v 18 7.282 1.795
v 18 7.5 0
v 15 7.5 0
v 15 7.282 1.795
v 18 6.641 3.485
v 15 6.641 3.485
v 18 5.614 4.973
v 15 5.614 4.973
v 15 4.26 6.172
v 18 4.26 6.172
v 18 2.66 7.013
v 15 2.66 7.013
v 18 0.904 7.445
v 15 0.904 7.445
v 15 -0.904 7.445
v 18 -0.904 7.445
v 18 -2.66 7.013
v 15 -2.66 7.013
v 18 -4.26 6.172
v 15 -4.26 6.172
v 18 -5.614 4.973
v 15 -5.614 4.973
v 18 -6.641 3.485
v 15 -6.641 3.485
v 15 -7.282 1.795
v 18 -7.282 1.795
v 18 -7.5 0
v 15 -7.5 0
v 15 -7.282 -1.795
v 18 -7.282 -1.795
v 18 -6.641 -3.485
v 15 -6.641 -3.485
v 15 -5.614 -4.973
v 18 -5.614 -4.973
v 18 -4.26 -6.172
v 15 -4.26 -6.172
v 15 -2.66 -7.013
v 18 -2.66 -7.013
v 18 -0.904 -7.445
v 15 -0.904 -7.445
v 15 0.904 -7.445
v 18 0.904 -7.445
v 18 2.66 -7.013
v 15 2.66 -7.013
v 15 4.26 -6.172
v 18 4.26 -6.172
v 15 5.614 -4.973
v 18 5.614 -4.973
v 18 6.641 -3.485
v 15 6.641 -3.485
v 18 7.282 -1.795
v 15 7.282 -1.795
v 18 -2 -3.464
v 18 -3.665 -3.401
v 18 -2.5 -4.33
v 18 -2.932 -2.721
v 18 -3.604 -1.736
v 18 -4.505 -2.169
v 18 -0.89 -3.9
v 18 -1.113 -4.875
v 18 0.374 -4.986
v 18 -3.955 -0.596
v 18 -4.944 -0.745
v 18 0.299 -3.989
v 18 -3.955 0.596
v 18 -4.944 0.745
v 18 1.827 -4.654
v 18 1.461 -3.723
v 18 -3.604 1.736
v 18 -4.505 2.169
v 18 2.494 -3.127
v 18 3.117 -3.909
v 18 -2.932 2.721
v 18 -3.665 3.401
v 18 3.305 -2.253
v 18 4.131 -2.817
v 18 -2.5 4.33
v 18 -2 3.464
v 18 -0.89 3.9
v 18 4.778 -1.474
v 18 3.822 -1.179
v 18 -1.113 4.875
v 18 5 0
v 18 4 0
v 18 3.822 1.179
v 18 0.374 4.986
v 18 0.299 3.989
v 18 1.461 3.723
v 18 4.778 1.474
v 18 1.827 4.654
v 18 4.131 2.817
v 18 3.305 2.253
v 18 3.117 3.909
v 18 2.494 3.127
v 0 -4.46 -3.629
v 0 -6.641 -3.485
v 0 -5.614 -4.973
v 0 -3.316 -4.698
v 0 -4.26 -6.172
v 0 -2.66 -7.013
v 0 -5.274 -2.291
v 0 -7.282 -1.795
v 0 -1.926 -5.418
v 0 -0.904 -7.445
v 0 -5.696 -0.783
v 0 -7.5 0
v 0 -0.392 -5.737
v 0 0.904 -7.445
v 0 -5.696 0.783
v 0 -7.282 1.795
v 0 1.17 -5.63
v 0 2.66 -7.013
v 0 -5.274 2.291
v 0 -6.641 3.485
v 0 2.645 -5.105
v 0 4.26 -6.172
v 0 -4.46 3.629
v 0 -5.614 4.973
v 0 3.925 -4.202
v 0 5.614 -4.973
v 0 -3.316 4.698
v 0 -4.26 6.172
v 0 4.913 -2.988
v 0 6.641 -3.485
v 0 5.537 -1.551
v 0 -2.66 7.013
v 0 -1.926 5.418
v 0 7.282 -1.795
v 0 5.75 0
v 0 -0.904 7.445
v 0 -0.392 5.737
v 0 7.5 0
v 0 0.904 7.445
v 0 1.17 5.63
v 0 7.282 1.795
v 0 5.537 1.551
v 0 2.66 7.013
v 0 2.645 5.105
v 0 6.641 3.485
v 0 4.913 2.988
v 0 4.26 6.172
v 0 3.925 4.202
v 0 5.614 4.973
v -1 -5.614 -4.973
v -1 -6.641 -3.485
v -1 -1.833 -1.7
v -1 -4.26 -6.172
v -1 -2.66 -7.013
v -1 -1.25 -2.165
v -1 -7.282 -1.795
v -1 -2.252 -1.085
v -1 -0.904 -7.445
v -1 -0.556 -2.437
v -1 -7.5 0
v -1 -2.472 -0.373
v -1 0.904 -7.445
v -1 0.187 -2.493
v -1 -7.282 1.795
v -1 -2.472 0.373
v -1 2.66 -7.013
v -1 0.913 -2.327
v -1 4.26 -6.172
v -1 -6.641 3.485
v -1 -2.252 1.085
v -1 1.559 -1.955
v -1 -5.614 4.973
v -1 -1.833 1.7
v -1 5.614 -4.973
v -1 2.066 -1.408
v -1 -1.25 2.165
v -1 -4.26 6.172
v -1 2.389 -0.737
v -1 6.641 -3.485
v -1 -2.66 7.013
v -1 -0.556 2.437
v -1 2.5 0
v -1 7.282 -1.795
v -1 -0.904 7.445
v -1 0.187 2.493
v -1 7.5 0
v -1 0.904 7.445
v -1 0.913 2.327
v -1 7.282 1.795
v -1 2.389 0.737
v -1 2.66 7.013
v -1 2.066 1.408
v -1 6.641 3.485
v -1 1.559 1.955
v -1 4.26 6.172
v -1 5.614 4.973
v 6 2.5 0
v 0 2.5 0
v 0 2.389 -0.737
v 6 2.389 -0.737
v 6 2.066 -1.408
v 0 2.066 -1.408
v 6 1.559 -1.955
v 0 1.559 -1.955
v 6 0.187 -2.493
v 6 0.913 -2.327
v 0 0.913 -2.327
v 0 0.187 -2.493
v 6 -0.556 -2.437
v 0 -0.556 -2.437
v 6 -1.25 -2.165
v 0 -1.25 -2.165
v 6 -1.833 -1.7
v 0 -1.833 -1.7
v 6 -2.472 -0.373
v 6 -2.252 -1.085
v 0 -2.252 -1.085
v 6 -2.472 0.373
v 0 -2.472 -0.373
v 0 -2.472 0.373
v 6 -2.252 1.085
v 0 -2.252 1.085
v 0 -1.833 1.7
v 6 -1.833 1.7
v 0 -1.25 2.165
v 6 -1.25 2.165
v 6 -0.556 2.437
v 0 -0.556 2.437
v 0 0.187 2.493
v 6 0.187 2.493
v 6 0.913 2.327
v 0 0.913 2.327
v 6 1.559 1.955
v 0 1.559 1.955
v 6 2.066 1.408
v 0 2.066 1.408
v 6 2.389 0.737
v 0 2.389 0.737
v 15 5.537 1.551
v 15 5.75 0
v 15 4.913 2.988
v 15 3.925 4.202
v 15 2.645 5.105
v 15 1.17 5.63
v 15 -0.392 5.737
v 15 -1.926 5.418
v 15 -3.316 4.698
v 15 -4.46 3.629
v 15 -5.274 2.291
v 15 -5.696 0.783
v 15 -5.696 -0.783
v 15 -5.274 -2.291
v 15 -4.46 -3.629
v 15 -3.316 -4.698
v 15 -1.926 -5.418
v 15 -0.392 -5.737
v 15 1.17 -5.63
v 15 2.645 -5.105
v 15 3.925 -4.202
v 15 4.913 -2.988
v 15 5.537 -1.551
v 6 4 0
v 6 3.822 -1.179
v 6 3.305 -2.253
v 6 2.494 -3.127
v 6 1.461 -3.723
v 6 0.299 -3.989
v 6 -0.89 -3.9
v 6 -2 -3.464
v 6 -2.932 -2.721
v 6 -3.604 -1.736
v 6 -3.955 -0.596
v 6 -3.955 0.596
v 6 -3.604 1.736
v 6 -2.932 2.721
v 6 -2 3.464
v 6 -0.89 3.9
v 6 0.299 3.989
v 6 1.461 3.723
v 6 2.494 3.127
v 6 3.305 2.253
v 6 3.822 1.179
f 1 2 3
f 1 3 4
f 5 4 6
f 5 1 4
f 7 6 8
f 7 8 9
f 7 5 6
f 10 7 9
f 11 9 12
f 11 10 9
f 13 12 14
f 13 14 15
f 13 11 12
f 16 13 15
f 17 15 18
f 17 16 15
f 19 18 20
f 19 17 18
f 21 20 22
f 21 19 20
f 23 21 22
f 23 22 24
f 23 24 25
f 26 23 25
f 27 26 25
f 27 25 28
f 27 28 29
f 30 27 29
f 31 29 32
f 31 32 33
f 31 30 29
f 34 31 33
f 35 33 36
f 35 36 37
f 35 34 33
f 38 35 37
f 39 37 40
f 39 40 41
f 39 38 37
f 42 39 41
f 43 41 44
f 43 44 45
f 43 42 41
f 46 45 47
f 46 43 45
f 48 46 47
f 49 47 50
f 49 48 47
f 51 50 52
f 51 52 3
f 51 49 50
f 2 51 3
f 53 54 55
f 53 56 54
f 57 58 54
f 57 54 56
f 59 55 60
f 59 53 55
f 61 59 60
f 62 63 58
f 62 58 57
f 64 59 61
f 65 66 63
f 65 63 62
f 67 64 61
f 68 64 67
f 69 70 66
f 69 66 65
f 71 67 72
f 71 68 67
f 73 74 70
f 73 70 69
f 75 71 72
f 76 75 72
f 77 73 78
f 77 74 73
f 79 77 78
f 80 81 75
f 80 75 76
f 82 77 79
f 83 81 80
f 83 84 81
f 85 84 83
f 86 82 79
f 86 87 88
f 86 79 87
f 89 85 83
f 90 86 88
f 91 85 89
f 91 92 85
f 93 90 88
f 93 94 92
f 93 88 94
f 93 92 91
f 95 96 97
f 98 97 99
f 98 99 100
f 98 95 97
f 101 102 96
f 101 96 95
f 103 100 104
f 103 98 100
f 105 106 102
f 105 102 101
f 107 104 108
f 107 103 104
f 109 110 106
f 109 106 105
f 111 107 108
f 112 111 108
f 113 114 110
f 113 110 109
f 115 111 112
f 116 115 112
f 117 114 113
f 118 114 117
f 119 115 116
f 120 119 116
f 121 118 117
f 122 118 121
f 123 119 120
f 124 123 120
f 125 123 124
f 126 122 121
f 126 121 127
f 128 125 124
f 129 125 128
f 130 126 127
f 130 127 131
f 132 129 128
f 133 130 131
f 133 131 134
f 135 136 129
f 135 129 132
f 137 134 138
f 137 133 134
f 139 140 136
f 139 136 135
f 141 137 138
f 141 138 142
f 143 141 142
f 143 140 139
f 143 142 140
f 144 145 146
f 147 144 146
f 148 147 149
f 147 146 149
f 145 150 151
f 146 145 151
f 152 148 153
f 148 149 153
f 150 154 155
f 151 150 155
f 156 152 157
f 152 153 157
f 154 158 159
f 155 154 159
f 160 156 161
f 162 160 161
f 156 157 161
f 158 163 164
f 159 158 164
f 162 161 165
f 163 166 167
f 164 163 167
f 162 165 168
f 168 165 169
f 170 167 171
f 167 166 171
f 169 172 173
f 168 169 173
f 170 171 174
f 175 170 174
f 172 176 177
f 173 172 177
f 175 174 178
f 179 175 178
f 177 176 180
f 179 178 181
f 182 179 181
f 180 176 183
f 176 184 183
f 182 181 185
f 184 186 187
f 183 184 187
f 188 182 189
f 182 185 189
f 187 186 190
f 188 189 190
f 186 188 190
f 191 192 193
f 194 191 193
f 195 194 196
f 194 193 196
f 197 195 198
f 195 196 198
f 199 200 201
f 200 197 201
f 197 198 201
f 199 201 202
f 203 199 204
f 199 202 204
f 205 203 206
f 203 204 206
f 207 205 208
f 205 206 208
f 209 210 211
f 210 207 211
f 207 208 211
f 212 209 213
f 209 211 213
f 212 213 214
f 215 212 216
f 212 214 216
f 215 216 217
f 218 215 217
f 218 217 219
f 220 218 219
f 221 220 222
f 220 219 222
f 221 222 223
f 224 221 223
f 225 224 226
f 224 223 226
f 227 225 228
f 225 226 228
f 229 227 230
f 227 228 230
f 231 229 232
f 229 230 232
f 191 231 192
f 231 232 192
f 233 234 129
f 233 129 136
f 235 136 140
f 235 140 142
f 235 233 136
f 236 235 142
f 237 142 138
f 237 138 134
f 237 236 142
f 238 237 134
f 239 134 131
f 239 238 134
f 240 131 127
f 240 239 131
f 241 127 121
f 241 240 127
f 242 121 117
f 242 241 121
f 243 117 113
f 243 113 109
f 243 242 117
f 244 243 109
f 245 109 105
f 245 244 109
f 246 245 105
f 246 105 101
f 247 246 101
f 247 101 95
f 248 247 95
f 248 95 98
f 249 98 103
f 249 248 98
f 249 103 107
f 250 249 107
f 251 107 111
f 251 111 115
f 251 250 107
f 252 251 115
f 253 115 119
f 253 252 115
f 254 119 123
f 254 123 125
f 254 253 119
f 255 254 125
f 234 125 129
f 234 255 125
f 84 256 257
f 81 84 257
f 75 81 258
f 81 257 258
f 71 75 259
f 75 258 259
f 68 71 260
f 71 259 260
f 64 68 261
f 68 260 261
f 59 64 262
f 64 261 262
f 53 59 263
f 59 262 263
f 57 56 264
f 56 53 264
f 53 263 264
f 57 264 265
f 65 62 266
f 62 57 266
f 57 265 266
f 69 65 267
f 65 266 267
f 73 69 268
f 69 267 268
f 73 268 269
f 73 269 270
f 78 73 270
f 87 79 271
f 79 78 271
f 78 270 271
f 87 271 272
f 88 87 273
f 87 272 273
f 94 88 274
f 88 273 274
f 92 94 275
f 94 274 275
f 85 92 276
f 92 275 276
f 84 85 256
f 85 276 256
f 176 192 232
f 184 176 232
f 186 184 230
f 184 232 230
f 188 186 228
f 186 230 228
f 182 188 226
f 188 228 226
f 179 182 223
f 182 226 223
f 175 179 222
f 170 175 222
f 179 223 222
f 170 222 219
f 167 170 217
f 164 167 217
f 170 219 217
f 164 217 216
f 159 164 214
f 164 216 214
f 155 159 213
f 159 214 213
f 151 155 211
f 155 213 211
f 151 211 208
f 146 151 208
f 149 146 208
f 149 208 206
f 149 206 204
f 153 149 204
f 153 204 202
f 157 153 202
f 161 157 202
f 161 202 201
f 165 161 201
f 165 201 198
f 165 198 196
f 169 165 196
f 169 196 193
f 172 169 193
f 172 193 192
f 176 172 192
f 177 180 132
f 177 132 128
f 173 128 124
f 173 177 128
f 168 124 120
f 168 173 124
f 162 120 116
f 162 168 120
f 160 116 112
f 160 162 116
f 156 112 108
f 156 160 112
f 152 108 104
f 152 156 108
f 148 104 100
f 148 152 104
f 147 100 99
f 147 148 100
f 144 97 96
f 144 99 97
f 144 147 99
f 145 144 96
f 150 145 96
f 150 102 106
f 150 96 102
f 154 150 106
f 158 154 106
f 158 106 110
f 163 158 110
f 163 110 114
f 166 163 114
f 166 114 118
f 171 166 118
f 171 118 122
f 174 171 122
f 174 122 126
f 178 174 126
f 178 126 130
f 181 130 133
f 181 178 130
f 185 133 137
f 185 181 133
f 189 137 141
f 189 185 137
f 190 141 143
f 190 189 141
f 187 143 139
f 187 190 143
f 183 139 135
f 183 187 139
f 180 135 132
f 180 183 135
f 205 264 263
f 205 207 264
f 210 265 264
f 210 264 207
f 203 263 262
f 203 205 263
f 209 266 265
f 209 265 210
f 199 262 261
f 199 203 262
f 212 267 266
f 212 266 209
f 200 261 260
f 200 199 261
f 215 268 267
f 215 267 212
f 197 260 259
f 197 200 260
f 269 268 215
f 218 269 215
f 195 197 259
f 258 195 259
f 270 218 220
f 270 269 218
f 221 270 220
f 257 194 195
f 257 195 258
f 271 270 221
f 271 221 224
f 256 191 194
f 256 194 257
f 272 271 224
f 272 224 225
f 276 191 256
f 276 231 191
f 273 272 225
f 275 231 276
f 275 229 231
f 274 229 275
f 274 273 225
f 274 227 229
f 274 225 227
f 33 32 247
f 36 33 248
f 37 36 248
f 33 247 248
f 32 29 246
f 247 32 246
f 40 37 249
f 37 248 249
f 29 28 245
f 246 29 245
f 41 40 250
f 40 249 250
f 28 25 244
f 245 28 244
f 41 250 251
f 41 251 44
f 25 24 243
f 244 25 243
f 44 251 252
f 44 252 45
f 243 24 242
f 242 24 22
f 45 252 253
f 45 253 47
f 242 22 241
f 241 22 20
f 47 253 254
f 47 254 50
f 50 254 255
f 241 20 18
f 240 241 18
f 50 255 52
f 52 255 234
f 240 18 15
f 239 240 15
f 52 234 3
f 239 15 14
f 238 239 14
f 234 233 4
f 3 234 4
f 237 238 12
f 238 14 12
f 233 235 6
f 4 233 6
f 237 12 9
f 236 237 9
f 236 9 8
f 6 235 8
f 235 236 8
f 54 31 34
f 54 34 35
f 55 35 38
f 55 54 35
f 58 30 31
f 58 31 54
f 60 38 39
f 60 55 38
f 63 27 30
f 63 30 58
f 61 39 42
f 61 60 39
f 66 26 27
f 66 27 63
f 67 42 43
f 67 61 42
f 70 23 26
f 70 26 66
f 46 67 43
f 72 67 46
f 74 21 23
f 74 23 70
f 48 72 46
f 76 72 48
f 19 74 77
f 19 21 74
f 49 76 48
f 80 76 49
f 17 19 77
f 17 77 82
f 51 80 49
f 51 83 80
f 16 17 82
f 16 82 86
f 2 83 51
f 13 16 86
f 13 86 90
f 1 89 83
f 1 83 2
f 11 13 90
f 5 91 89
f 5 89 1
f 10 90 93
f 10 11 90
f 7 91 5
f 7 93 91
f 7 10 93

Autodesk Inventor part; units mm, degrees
ref_plane "YZ Plane" through (0, 0, 0) normal (1, 0, 0) x (0, 1, 0)
ref_plane "XZ Plane" through (0, 0, 0) normal (0, 1, 0) x (-1, 0, 0)
ref_plane "XY Plane" through (0, 0, 0) normal (0, 0, 1) x (1, 0, 0)
sketch "Sketch1" plane through (0, 0, 0) normal (0, 0, 1) x (1, 0, 0)
  line L0 (0, 0) -> (4, 0)
  line L1 (0, 0) -> (0, 2.5)
  line L2 (0, 5.75) -> (15, 5.75)
  line L3 (15, 5.75) -> (15, 7.5)
  line L4 (18, 5) -> (18, 4)
  line L5 (18, 4) -> (6, 4)
  line L6 (6, 4) -> (6, 2.5)
  line L7 (6, 2.5) -> (0, 2.5)
  line L8 (0, 5.75) -> (0, 7.5)
  line L9 (0, 7.5) -> (-1, 7.5)
  line L10 (-1, 7.5) -> (-1, 2.5)
  line L11 (-1, 2.5) -> (0, 2.5)
  line L12 (15, 7.5) -> (18, 7.5)
  line L13 (18, 7.5) -> (18, 5)
  dimension "d0" = 4
  dimension "d1" = 5.75
  dimension "d2" = 15
  dimension "d3" = 1.75
  dimension "d7" = 1
  dimension "d8" = 12
  dimension "d9" = 1.5
  dimension "d11" = 1
revolve "Revolution1" add sketch "Sketch1" angle 360 about axis through (0, 0, 0) along (1, 0, 0)
properties part number "pignon 12 dents cournt"
